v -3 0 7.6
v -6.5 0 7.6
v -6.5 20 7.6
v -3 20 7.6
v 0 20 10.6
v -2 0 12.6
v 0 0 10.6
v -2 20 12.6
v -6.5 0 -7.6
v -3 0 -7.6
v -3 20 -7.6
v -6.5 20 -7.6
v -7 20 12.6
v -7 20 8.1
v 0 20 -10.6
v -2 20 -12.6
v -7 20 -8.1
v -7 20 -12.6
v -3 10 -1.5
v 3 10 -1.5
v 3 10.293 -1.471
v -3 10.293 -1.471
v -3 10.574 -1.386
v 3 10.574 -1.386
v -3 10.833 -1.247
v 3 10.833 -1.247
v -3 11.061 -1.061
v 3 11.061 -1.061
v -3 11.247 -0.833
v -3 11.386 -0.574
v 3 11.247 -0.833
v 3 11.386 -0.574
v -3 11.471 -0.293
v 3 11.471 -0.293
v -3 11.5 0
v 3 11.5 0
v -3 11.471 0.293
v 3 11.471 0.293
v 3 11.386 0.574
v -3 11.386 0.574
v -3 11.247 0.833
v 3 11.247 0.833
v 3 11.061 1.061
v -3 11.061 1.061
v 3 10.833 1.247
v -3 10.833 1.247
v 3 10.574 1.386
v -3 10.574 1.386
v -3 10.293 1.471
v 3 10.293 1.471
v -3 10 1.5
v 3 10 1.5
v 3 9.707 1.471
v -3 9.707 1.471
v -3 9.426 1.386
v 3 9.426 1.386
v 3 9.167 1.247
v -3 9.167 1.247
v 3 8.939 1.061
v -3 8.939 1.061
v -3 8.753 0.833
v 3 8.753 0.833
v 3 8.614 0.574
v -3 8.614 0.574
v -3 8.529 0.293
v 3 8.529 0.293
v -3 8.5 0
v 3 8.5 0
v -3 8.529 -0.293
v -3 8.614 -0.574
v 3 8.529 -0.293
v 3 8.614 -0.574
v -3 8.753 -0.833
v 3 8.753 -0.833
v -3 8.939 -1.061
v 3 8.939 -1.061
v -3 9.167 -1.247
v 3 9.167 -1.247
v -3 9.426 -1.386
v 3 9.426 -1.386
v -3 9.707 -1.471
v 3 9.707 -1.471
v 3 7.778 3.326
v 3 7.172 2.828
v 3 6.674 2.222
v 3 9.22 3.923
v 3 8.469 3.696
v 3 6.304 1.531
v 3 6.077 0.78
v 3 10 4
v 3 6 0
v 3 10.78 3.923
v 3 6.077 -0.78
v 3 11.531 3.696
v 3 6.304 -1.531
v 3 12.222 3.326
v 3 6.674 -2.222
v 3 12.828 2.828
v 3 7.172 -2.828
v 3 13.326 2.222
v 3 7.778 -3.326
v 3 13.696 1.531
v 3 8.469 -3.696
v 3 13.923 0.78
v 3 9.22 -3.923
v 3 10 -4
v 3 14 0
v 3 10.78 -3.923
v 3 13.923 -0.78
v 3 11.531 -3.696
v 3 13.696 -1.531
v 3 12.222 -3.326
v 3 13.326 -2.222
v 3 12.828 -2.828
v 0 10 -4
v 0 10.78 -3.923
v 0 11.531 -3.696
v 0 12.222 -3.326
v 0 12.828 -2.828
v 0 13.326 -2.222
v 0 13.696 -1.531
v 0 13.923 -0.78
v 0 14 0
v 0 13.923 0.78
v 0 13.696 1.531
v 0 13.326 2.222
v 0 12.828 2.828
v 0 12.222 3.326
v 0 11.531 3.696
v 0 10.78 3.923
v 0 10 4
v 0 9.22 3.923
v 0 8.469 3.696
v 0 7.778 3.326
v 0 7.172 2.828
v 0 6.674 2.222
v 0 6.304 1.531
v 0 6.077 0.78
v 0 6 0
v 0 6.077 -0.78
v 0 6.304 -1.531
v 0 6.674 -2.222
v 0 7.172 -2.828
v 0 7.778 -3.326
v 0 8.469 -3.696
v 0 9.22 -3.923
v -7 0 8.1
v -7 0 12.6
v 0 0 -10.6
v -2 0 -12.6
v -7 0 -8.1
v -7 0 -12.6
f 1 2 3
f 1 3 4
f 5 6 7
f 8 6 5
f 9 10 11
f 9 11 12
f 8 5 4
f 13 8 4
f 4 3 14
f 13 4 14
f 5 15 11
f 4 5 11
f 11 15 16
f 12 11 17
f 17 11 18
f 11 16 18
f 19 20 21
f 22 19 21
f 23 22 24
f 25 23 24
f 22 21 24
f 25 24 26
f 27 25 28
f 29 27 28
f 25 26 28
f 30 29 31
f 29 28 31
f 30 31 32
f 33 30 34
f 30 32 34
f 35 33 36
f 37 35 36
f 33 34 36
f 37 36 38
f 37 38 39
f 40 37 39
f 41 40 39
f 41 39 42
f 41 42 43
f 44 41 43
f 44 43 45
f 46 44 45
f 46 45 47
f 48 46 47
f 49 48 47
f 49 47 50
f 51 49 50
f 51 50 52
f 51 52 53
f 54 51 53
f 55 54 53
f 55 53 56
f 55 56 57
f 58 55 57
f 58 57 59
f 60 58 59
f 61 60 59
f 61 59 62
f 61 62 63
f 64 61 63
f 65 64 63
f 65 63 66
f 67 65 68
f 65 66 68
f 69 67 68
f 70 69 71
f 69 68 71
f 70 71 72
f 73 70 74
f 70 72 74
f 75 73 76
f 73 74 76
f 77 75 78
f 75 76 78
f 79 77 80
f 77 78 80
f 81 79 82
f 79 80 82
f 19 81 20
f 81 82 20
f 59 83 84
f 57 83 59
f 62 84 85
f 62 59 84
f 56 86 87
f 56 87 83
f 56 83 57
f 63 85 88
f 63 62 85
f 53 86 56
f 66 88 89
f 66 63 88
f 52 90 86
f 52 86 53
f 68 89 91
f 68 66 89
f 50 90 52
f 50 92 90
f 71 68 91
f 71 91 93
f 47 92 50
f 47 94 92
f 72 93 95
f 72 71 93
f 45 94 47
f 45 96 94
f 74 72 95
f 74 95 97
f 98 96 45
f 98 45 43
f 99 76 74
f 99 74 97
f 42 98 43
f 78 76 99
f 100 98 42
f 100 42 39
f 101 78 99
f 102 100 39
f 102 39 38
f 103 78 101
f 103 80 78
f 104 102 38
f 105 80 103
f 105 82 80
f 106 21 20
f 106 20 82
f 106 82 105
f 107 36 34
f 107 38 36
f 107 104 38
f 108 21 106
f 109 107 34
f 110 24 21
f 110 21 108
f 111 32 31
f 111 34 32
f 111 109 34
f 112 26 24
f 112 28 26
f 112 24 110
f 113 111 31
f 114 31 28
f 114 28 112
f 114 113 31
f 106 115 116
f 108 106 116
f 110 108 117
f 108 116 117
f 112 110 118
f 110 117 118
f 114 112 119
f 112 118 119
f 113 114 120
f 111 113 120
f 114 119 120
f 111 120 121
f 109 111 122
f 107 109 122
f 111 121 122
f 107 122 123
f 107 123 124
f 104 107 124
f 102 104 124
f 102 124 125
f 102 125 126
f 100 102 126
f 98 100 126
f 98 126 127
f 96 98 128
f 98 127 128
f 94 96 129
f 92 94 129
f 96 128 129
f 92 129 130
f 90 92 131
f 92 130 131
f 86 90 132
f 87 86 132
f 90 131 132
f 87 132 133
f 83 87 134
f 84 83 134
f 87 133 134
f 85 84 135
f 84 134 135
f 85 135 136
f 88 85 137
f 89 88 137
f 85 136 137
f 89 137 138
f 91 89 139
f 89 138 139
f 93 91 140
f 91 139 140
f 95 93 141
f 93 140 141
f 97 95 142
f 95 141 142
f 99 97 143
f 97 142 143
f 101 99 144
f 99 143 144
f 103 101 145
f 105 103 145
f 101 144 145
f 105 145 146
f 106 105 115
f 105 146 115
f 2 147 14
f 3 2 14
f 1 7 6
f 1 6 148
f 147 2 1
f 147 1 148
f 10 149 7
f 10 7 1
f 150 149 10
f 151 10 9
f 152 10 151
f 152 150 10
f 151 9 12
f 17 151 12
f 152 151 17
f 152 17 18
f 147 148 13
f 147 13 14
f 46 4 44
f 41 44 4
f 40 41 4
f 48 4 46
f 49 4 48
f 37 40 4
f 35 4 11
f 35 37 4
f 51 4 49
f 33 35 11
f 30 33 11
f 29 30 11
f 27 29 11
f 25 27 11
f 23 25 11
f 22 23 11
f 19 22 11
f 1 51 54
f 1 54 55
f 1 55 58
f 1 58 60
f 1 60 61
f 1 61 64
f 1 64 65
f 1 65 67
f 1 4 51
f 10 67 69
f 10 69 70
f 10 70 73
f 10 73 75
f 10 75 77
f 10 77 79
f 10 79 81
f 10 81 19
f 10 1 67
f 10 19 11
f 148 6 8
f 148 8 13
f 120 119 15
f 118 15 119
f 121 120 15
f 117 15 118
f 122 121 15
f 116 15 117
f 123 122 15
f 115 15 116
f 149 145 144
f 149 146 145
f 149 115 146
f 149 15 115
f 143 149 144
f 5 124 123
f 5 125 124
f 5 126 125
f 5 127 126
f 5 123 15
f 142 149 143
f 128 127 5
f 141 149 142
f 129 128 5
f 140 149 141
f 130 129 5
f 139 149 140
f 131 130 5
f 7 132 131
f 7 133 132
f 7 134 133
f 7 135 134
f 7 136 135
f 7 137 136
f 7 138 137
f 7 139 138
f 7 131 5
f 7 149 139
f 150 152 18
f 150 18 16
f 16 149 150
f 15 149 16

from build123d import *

# Parameters (mm, degrees)
EXTRUDE_1_DEPTH     = 20
CHAMFER_1_SIZE      = 2
CHAMFER_3_SIZE      = 0.5
SKETCH_2_R          = 4
EXTRUDE_2_DEPTH     = 3
SKETCH_3_R          = 1.5
CUT_EXTRUDE_1_DEPTH = 10


with BuildPart() as part:
    # 草图1 → 凸台-拉伸1 (new body)
    with BuildSketch(Plane(origin=(0, 0, 0), x_dir=(1, 0, 0), z_dir=(0, 1, 0))):
        Polygon((-7, 12.6), (0, 12.6), (0, -12.6), (-7, -12.6), (-7, -7.6), (-3, -7.6), (-3, 7.6), (-7, 7.6), align=None)
    extrude(amount=EXTRUDE_1_DEPTH)

    # 倒角1
    chamfer_1_edges = [part.edges().sort_by_distance(p)[0] for p in [
        (0, 10, -12.6),
        (0, 10, 12.6),
    ]]
    chamfer(chamfer_1_edges, length=CHAMFER_1_SIZE)

    # 倒角3
    chamfer_3_edges = [part.edges().sort_by_distance(p)[0] for p in [
        (-7, 10, 7.6),
        (-7, 10, -7.6),
    ]]
    chamfer(chamfer_3_edges, length=CHAMFER_3_SIZE)

    # 草图2 → 凸台-拉伸2 (add)
    with BuildSketch(Plane(origin=(0, 0, 0), x_dir=(0, 0, -1), z_dir=(1, 0, 0))):
        with Locations((0, 10)):
            Circle(SKETCH_2_R)
    extrude(amount=EXTRUDE_2_DEPTH)

    # 草图3 → 切除-拉伸1 (cut)
    with BuildSketch(Plane(origin=(3, 0, 0), x_dir=(0, 0, -1), z_dir=(1, 0, 0))):
        with Locations((0, 10)):
            Circle(SKETCH_3_R)
    extrude(amount=-CUT_EXTRUDE_1_DEPTH, mode=Mode.SUBTRACT)


solid = part.part
